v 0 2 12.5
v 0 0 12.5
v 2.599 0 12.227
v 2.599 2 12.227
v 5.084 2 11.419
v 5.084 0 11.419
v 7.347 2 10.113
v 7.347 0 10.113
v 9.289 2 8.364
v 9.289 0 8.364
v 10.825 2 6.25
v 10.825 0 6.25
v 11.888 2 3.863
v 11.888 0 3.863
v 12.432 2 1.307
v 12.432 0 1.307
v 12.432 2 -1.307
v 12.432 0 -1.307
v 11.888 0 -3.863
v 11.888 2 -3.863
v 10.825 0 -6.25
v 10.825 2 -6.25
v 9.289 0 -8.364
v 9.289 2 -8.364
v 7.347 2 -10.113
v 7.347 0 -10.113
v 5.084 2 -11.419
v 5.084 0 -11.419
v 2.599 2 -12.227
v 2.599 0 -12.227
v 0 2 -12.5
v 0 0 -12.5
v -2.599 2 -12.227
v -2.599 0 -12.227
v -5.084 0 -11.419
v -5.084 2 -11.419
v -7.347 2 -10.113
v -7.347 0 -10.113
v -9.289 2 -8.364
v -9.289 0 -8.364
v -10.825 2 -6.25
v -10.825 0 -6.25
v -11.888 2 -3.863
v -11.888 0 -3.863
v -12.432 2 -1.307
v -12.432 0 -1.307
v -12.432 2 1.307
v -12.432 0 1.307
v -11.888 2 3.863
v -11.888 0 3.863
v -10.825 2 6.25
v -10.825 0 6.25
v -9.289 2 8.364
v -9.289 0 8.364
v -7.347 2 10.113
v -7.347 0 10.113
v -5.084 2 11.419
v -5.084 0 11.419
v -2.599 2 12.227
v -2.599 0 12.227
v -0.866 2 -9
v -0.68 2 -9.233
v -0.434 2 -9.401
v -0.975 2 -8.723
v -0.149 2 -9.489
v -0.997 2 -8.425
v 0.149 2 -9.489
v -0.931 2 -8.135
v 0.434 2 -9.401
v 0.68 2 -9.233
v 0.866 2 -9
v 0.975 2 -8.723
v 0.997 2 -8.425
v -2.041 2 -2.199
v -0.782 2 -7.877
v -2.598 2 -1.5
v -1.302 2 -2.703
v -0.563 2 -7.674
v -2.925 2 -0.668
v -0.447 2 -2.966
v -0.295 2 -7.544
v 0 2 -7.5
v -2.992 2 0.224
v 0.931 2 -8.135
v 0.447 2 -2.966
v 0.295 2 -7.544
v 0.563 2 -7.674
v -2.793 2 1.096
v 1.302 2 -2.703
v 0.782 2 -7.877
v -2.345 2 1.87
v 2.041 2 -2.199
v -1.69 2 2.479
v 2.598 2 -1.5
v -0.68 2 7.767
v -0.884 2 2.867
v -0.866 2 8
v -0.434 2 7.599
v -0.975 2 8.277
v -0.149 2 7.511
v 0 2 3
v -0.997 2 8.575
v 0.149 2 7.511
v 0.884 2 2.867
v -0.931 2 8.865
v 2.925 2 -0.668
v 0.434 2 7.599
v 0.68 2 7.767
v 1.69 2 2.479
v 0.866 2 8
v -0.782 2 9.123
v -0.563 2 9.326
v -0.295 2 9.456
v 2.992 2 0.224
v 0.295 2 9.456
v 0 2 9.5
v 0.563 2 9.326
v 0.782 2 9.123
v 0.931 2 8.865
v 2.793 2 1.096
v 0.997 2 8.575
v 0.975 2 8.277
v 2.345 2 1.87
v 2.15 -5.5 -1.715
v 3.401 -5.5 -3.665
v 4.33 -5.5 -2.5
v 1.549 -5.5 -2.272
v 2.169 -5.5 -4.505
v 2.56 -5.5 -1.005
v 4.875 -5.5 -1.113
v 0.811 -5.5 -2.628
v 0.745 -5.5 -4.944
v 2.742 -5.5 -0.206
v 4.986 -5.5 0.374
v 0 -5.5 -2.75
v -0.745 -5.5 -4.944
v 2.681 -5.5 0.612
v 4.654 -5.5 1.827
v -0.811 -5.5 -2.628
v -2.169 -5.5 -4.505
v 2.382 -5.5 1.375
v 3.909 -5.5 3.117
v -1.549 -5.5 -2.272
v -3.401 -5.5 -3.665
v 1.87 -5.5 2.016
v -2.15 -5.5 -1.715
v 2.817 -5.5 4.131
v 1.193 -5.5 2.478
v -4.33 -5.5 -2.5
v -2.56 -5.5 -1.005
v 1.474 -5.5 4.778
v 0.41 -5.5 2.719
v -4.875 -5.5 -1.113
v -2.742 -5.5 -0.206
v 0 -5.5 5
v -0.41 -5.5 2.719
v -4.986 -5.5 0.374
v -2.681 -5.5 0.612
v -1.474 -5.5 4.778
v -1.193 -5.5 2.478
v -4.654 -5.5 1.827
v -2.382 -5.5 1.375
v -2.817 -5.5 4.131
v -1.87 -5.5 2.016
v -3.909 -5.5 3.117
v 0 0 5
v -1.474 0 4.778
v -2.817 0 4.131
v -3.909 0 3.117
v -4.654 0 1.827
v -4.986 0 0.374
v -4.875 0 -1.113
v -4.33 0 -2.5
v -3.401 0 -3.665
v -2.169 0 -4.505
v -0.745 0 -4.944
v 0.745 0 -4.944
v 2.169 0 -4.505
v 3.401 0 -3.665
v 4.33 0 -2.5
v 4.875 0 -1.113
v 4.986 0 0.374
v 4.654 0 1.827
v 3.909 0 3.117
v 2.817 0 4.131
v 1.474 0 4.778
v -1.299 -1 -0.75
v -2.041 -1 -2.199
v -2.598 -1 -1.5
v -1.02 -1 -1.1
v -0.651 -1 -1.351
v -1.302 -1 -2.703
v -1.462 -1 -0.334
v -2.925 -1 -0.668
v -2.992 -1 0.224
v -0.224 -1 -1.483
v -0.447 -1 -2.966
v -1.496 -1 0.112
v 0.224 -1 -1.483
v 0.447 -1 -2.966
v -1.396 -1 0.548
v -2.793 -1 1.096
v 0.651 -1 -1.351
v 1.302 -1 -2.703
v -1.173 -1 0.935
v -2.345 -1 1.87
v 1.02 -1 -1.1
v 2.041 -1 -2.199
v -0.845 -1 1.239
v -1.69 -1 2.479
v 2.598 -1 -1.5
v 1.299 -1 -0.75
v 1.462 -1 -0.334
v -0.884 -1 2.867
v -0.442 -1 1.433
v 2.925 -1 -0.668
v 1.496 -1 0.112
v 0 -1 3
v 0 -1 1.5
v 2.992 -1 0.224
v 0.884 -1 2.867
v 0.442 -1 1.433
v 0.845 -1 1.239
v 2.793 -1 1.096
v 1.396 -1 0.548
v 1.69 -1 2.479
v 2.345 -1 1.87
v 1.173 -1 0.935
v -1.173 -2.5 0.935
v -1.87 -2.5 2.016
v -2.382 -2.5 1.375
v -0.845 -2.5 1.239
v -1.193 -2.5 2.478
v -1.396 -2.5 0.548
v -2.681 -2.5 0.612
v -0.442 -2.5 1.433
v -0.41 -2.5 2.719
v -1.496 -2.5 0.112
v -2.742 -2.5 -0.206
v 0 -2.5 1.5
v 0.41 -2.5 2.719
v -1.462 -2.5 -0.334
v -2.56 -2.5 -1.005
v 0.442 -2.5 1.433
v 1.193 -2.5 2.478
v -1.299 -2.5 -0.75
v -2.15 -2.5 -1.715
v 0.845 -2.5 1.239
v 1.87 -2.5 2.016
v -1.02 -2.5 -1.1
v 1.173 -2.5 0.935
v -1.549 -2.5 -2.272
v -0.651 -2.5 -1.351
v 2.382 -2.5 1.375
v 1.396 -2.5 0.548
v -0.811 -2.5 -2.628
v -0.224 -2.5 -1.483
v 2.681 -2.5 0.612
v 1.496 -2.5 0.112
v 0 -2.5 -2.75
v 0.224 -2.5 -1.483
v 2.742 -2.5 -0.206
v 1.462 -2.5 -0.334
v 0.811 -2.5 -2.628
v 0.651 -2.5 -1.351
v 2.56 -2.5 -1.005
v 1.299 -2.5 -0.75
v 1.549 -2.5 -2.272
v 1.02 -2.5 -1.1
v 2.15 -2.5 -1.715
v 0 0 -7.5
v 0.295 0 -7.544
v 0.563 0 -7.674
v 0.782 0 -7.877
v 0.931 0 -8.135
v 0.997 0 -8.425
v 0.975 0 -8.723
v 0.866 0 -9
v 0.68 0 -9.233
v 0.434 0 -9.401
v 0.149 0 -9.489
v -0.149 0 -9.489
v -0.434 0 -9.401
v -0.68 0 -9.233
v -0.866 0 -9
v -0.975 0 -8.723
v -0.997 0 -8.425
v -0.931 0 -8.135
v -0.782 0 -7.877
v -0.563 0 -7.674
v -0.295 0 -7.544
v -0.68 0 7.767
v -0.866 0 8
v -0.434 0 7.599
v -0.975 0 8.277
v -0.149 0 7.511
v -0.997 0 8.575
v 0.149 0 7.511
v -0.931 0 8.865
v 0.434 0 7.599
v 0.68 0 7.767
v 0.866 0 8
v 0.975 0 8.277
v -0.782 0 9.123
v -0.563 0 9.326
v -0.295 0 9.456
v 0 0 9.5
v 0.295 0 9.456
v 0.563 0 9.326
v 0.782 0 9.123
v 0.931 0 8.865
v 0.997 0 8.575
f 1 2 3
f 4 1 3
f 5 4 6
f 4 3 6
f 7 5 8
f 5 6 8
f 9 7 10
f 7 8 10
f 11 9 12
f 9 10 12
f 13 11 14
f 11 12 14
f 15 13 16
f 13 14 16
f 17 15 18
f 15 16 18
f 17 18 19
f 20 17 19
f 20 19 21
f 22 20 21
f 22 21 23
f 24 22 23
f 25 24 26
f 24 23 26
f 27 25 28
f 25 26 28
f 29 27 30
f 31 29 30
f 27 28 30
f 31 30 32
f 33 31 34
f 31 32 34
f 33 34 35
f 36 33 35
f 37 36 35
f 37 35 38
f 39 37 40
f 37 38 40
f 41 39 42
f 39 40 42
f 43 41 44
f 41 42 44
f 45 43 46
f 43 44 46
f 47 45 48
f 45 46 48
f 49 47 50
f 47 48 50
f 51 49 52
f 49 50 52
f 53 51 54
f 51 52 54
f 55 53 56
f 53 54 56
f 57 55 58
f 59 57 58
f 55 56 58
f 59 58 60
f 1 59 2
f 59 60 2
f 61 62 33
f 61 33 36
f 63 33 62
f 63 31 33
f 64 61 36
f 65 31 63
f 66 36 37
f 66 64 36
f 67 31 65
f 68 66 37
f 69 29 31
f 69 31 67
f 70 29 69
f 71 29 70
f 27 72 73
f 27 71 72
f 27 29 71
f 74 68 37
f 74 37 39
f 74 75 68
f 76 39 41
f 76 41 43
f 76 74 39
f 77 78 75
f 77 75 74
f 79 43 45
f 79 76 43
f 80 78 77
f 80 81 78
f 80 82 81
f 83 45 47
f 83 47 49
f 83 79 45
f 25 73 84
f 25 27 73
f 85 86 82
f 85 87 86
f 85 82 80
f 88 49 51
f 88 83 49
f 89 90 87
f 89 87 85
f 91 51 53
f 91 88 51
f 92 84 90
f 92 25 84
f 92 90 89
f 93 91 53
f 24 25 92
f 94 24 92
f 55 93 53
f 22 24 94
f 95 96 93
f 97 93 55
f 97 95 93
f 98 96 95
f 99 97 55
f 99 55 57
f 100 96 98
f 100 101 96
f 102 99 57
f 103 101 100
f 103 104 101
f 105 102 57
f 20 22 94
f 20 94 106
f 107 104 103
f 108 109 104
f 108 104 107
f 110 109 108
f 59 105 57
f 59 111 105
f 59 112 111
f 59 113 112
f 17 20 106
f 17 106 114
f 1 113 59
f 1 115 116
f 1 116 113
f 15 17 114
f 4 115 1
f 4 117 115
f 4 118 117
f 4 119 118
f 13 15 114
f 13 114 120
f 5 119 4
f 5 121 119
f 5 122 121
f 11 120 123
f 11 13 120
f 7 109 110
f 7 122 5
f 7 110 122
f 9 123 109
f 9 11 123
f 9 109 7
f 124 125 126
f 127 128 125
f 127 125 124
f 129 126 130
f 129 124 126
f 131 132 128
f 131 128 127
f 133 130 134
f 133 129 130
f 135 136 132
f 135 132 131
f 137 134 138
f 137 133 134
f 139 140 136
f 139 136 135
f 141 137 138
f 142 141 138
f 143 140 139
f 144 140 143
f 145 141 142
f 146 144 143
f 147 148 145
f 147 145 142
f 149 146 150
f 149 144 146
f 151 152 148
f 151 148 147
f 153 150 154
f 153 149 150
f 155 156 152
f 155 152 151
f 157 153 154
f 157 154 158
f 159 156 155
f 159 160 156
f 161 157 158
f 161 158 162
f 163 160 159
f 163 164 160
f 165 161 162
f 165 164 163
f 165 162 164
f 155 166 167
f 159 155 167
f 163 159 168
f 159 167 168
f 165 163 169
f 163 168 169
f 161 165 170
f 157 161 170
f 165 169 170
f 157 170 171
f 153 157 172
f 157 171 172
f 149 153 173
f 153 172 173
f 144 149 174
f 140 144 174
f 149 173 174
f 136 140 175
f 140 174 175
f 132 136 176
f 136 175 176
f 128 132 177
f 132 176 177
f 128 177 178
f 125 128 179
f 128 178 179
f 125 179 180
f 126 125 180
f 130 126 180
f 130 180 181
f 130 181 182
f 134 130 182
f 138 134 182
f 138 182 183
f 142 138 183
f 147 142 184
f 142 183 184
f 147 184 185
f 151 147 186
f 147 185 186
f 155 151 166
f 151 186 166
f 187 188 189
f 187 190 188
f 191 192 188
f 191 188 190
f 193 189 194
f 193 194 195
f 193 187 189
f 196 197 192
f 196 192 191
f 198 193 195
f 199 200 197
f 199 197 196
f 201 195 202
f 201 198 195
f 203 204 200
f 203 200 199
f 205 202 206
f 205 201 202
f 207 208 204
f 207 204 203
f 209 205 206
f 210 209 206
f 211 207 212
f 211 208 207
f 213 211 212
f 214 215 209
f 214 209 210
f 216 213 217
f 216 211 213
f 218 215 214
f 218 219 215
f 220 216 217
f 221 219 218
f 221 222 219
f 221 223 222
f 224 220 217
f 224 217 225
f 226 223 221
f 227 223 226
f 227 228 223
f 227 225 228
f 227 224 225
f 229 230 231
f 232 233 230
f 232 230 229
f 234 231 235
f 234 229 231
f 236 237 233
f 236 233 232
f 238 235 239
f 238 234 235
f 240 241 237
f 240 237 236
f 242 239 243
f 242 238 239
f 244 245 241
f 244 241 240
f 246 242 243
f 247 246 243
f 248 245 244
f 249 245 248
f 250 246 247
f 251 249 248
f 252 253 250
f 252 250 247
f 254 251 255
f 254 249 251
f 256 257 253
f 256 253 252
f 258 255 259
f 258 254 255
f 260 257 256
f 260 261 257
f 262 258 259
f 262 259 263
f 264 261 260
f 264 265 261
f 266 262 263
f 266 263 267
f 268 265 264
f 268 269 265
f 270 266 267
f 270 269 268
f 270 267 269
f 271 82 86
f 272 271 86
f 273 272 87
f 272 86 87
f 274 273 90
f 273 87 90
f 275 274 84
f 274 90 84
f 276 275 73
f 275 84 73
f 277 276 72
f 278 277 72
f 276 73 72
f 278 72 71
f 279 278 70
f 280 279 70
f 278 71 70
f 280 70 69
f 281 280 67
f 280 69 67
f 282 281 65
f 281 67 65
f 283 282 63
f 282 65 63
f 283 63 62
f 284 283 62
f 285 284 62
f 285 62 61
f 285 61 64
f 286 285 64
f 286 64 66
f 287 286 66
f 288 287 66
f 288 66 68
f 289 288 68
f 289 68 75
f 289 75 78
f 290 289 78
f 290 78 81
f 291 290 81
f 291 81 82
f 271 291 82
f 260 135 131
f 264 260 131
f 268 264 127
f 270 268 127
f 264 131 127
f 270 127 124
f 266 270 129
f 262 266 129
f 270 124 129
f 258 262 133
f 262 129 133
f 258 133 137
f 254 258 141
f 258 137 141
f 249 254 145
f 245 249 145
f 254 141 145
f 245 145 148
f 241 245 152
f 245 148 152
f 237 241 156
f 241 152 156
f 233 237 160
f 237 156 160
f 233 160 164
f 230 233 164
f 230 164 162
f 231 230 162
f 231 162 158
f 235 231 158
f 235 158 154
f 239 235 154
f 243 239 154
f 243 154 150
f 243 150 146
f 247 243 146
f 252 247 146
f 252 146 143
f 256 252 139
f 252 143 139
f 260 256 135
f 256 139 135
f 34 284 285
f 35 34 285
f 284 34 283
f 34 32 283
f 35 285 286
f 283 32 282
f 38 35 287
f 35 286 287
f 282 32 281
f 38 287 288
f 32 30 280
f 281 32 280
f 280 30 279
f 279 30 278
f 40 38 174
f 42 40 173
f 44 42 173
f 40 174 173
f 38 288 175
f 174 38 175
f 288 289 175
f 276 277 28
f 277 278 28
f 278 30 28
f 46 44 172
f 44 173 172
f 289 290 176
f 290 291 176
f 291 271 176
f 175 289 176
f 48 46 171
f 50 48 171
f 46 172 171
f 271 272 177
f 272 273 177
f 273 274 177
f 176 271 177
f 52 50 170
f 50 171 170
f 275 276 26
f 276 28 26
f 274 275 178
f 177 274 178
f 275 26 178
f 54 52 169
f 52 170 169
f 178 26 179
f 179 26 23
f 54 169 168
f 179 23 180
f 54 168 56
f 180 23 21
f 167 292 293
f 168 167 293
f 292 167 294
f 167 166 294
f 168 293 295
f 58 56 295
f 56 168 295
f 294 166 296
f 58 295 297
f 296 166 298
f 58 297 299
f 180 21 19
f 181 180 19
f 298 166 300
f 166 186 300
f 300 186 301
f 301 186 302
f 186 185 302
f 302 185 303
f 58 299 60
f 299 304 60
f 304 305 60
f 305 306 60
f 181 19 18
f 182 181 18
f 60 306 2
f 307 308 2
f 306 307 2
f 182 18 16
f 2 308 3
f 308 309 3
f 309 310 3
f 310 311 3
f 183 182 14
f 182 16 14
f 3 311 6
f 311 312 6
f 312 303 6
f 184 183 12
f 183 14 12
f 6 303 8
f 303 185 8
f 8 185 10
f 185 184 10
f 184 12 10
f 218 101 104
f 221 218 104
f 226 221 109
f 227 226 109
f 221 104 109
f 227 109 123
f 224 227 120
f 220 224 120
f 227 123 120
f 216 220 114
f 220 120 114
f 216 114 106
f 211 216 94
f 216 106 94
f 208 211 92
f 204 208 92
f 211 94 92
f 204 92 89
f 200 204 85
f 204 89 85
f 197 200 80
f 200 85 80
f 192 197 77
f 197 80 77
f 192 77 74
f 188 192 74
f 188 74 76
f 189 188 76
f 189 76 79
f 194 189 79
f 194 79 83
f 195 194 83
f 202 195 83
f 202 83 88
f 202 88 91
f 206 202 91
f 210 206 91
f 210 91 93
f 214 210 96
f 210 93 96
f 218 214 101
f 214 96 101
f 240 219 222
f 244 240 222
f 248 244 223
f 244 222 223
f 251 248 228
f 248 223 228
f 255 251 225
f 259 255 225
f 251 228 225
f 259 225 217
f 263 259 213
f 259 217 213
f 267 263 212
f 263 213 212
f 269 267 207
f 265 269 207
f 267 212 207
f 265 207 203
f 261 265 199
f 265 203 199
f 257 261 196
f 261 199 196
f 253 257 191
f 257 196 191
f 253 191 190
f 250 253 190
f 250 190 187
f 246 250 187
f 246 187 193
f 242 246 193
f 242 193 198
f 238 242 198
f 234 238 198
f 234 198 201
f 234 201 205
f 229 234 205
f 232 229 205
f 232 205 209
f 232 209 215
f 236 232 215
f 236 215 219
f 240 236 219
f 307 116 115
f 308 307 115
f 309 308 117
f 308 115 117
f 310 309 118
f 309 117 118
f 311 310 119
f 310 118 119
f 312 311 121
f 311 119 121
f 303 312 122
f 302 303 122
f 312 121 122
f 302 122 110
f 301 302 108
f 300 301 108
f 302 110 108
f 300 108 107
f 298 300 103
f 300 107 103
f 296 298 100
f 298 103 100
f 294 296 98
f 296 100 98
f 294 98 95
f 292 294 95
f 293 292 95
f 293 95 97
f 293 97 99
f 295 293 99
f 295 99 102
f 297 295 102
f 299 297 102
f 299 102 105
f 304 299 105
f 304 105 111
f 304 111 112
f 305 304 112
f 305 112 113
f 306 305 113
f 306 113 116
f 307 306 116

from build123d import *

# Parameters (mm, degrees)
SKETCH1_R           = 12.5
BOSS_EXTRUDE1_DEPTH = 2
SKETCH2_R           = 5
BOSS_EXTRUDE2_DEPTH = 5.5
SKETCH3_R           = 2.75
CUT_EXTRUDE1_DEPTH  = 3
CUT_EXTRUDE2_REACH  = 21.203
SKETCH4_R           = 1
SKETCH5_R           = 3
CUT_EXTRUDE3_DEPTH  = 3
CUT_EXTRUDE4_REACH  = 20.241
SKETCH6_R           = 1.5


with BuildPart() as part:
    # Sketch1 → Boss-Extrude1 (new body)
    with BuildSketch(Plane(origin=(0, 0, 0), x_dir=(1, 0, 0), z_dir=(0, 1, 0))):
        with Locations(Location((0, 0, 0), (0, 0, 270))):
            Circle(SKETCH1_R)
    extrude(amount=BOSS_EXTRUDE1_DEPTH)

    # Sketch2 → Boss-Extrude2 (add)
    with BuildSketch(Plane.XZ):
        with Locations(Location((0, 0, 0), (0, 0, 90))):
            Circle(SKETCH2_R)
    extrude(amount=BOSS_EXTRUDE2_DEPTH)

    # Sketch3 → Cut-Extrude1 (cut)
    with BuildSketch(Plane.XZ.offset(5.5)):
        with Locations(Location((0, 0, 0), (0, 0, 270))):
            Circle(SKETCH3_R)
    extrude(amount=-CUT_EXTRUDE1_DEPTH, mode=Mode.SUBTRACT)

    # Sketch4 → Cut-Extrude2 (cut, up to next)
    with BuildSketch(Plane(origin=(0, 2, 0), x_dir=(1, 0, 0), z_dir=(0, 1, 0)), mode=Mode.PRIVATE) as cut_extrude2_sk1:
        with Locations(Location((0, 8.5, 0), (0, 0, 270))):
            Circle(SKETCH4_R)
    cut_extrude2_tool1 = extrude(cut_extrude2_sk1.sketch, amount=-CUT_EXTRUDE2_REACH, mode=Mode.PRIVATE) & part.part
    # Sketch4 → Cut-Extrude2 (cut, up to next)
    with BuildSketch(Plane(origin=(0, 2, 0), x_dir=(1, 0, 0), z_dir=(0, 1, 0)), mode=Mode.PRIVATE) as cut_extrude2_sk2:
        with Locations(Location((0, -8.5, 0), (0, 0, 270))):
            Circle(SKETCH4_R)
    cut_extrude2_tool2 = extrude(cut_extrude2_sk2.sketch, amount=-CUT_EXTRUDE2_REACH, mode=Mode.PRIVATE) & part.part
    add(cut_extrude2_tool1.solids().sort_by_distance((0, 2, -8.5))[0], mode=Mode.SUBTRACT)
    add(cut_extrude2_tool2.solids().sort_by_distance((0, 2, 8.5))[0], mode=Mode.SUBTRACT)

    # Sketch5 → Cut-Extrude3 (cut)
    with BuildSketch(Plane(origin=(0, 2, 0), x_dir=(1, 0, 0), z_dir=(0, 1, 0))):
        with Locations(Location((0, 0, 0), (0, 0, 270))):
            Circle(SKETCH5_R)
    extrude(amount=-CUT_EXTRUDE3_DEPTH, mode=Mode.SUBTRACT)

    # Sketch6 → Cut-Extrude4 (cut, up to next)
    with BuildSketch(Plane(origin=(0, -1, 0), x_dir=(1, 0, 0), z_dir=(0, 1, 0)), mode=Mode.PRIVATE) as cut_extrude4_sk1:
        with Locations(Location((0, 0, 0), (0, 0, 270))):
            Circle(SKETCH6_R)
    cut_extrude4_tool1 = extrude(cut_extrude4_sk1.sketch, amount=-CUT_EXTRUDE4_REACH, mode=Mode.PRIVATE) & part.part
    add(cut_extrude4_tool1.solids().sort_by_distance((0, -1, 0))[0], mode=Mode.SUBTRACT)


solid = part.part
